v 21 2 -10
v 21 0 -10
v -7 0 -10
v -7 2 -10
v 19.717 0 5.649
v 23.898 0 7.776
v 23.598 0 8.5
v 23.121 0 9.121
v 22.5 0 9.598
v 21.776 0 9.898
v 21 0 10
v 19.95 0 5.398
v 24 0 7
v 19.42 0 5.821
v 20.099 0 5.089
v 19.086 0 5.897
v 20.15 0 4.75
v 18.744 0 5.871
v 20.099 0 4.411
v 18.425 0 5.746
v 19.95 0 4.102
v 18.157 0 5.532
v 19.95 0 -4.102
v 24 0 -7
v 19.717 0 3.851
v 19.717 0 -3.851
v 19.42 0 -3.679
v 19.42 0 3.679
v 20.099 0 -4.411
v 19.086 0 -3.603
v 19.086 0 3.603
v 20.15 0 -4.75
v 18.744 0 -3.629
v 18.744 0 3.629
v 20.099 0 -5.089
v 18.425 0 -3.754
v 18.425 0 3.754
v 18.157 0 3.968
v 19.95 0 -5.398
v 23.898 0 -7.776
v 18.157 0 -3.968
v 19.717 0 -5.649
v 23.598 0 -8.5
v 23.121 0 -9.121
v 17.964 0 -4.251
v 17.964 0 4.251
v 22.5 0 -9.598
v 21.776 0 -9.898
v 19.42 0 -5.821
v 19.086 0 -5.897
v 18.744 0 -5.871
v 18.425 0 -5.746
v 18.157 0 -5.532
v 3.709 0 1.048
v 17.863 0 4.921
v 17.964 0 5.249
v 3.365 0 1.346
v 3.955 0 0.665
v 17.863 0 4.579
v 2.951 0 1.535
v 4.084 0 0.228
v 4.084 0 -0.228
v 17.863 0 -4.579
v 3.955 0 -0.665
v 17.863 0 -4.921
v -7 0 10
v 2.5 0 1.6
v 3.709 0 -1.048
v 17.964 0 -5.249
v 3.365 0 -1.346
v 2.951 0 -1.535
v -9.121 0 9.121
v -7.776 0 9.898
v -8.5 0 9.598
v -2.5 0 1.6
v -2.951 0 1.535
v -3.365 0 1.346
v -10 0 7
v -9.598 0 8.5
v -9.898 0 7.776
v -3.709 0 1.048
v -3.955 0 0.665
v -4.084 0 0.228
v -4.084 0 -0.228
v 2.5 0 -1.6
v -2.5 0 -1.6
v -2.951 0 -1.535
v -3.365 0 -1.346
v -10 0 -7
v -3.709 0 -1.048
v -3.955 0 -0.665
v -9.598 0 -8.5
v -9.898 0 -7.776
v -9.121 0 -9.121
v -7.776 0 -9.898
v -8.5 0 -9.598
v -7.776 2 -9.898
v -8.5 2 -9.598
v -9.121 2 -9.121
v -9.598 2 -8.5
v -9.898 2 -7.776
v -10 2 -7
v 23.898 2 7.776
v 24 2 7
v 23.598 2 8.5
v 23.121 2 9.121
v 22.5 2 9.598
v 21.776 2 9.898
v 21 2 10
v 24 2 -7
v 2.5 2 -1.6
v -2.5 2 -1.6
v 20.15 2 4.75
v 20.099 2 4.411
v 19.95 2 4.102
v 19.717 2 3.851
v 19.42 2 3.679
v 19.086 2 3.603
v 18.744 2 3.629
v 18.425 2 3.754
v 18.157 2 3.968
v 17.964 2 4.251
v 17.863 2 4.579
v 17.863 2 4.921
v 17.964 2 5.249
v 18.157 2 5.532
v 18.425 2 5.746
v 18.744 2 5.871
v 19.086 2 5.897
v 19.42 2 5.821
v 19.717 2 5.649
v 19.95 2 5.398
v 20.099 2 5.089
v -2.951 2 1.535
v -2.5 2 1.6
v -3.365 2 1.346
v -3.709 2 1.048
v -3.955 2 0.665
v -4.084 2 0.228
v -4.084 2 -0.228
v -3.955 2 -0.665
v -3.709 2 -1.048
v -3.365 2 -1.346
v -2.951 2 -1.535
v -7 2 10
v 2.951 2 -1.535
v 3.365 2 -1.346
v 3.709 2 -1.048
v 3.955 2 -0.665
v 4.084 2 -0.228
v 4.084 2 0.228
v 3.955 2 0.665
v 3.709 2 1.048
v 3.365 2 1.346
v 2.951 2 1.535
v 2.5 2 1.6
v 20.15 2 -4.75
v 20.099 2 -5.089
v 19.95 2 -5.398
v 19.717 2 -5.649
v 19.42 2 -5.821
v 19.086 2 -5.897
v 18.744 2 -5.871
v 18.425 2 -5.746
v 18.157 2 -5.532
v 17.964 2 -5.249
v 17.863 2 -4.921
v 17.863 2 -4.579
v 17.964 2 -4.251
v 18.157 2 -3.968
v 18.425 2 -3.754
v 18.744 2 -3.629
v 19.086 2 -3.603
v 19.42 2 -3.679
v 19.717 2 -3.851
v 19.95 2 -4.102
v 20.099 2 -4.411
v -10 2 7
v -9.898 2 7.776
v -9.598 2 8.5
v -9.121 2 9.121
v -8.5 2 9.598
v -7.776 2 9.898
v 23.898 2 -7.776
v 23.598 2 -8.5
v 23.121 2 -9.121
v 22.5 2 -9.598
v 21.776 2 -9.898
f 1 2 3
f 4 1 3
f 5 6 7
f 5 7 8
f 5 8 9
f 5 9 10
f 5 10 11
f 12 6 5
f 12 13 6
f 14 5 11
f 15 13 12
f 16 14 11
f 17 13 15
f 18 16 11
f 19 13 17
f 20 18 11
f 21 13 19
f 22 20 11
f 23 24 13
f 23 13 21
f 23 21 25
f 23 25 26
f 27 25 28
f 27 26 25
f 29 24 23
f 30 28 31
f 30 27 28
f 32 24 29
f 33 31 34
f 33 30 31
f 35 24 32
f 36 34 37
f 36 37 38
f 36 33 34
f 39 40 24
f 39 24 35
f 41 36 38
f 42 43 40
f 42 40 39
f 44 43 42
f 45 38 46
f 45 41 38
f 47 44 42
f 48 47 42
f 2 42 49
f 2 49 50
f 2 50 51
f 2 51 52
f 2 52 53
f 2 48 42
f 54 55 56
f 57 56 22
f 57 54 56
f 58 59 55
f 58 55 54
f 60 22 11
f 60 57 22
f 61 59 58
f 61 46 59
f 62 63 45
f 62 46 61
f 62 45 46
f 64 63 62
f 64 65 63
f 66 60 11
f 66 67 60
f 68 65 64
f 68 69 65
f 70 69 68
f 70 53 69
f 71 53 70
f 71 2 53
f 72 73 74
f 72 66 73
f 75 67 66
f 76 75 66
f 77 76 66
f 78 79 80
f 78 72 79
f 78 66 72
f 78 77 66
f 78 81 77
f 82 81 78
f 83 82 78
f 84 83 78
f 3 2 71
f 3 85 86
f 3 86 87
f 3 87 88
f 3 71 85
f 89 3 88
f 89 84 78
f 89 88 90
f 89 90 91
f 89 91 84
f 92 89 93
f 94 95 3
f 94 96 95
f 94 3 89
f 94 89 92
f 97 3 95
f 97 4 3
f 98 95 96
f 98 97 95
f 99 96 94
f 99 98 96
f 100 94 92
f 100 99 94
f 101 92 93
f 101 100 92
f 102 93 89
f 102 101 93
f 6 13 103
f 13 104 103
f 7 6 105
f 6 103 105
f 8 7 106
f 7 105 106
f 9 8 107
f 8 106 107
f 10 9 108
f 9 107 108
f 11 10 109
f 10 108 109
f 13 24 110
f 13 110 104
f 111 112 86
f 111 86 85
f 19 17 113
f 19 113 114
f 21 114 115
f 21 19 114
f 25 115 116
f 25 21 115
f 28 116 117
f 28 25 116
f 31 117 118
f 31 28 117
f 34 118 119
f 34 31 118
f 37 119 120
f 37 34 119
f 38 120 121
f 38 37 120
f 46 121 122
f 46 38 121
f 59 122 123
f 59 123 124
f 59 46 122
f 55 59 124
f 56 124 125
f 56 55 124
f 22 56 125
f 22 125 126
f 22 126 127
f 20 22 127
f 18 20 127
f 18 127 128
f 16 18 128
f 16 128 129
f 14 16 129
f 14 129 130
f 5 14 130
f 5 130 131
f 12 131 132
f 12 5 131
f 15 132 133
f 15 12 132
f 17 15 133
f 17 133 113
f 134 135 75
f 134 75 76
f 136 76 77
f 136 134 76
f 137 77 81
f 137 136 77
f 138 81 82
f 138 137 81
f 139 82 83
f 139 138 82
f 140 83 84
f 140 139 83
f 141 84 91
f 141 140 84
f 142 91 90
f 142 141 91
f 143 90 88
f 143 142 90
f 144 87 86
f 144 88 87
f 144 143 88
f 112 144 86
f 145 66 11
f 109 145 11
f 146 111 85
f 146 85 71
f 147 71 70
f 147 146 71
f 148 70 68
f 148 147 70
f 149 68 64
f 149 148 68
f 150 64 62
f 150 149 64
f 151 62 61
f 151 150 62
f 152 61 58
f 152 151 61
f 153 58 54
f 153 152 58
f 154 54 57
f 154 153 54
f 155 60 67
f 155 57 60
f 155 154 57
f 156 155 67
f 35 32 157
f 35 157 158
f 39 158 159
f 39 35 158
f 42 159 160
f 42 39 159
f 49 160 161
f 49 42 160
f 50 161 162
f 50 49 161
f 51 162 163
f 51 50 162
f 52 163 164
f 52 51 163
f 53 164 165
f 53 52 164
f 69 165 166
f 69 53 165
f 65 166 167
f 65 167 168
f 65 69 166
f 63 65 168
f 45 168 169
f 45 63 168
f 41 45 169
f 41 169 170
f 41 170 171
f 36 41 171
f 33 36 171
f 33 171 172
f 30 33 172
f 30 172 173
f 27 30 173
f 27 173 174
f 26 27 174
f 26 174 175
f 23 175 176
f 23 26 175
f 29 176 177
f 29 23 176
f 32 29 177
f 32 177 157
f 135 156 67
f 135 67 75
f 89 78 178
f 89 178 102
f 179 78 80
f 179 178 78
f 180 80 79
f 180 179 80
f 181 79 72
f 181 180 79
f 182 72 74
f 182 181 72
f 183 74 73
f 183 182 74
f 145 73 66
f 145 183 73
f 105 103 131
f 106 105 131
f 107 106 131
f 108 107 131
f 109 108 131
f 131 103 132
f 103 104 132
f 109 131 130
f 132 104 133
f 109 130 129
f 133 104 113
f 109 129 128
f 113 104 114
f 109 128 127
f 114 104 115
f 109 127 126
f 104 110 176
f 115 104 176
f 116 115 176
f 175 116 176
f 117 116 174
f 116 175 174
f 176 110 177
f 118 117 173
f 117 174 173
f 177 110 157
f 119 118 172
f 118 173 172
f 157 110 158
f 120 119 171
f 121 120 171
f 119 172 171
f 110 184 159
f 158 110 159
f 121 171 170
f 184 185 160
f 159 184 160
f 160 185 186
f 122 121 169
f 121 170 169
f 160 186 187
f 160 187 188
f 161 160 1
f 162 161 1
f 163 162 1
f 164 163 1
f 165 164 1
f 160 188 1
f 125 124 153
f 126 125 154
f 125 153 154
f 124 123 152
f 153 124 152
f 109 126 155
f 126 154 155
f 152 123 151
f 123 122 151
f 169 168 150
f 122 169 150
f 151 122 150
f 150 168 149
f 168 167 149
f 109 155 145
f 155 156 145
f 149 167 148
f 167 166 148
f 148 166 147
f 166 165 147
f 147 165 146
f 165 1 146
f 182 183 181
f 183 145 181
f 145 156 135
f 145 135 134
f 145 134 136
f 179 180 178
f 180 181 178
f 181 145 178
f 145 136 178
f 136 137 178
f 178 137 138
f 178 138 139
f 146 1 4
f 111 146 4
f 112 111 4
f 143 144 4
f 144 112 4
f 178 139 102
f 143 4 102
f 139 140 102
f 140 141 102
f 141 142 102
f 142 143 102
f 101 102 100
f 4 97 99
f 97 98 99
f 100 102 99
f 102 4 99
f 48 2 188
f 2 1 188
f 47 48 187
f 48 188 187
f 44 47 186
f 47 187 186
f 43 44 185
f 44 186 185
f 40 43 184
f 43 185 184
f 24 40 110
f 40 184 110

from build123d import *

# Parameters (mm, degrees)
SKETCH_1_R          = 1.6
SKETCH_1_R_2        = 1.15
EXTRUDE_1_DEPTH     = 2
FILLET_2_R          = 3
CUT_EXTRUDE_1_DEPTH = 10


with BuildPart() as part:
    # 草图1 → 凸台-拉伸1 (new body)
    with BuildSketch(Plane(origin=(0, 0, 0), x_dir=(1, 0, 0), z_dir=(0, 1, 0))):
        Polygon((-10, 10), (10, 10), (24, 10), (24, -10), (10, -10), (-10, -10), align=None)
        Circle(SKETCH_1_R, mode=Mode.SUBTRACT)
        with Locations((19, -4.75)):
            Circle(SKETCH_1_R_2, mode=Mode.SUBTRACT)
        with Locations((19, 4.75)):
            Circle(SKETCH_1_R_2, mode=Mode.SUBTRACT)
    extrude(amount=EXTRUDE_1_DEPTH)

    # 圆角2
    fillet_2_edges = [part.edges().sort_by_distance(p)[0] for p in [
        (-10, 1, -10),
        (24, 1, -10),
        (24, 1, 10),
        (-10, 1, 10),
    ]]
    fillet(fillet_2_edges, radius=FILLET_2_R)

    # 草图2 → 切除-拉伸1 (cut)
    with BuildSketch(Plane(origin=(0, 2, 0), x_dir=(1, 0, 0), z_dir=(0, 1, 0))):
        with BuildLine():
            Line((2.5, -1.6), (-2.5, -1.6))
            ThreePointArc((-2.5, -1.6), (-4.1, 0), (-2.5, 1.6))
            Line((-2.5, 1.6), (2.5, 1.6))
            ThreePointArc((2.5, 1.6), (4.1, 0), (2.5, -1.6))
        make_face()
    extrude(amount=-CUT_EXTRUDE_1_DEPTH, mode=Mode.SUBTRACT)


solid = part.part
